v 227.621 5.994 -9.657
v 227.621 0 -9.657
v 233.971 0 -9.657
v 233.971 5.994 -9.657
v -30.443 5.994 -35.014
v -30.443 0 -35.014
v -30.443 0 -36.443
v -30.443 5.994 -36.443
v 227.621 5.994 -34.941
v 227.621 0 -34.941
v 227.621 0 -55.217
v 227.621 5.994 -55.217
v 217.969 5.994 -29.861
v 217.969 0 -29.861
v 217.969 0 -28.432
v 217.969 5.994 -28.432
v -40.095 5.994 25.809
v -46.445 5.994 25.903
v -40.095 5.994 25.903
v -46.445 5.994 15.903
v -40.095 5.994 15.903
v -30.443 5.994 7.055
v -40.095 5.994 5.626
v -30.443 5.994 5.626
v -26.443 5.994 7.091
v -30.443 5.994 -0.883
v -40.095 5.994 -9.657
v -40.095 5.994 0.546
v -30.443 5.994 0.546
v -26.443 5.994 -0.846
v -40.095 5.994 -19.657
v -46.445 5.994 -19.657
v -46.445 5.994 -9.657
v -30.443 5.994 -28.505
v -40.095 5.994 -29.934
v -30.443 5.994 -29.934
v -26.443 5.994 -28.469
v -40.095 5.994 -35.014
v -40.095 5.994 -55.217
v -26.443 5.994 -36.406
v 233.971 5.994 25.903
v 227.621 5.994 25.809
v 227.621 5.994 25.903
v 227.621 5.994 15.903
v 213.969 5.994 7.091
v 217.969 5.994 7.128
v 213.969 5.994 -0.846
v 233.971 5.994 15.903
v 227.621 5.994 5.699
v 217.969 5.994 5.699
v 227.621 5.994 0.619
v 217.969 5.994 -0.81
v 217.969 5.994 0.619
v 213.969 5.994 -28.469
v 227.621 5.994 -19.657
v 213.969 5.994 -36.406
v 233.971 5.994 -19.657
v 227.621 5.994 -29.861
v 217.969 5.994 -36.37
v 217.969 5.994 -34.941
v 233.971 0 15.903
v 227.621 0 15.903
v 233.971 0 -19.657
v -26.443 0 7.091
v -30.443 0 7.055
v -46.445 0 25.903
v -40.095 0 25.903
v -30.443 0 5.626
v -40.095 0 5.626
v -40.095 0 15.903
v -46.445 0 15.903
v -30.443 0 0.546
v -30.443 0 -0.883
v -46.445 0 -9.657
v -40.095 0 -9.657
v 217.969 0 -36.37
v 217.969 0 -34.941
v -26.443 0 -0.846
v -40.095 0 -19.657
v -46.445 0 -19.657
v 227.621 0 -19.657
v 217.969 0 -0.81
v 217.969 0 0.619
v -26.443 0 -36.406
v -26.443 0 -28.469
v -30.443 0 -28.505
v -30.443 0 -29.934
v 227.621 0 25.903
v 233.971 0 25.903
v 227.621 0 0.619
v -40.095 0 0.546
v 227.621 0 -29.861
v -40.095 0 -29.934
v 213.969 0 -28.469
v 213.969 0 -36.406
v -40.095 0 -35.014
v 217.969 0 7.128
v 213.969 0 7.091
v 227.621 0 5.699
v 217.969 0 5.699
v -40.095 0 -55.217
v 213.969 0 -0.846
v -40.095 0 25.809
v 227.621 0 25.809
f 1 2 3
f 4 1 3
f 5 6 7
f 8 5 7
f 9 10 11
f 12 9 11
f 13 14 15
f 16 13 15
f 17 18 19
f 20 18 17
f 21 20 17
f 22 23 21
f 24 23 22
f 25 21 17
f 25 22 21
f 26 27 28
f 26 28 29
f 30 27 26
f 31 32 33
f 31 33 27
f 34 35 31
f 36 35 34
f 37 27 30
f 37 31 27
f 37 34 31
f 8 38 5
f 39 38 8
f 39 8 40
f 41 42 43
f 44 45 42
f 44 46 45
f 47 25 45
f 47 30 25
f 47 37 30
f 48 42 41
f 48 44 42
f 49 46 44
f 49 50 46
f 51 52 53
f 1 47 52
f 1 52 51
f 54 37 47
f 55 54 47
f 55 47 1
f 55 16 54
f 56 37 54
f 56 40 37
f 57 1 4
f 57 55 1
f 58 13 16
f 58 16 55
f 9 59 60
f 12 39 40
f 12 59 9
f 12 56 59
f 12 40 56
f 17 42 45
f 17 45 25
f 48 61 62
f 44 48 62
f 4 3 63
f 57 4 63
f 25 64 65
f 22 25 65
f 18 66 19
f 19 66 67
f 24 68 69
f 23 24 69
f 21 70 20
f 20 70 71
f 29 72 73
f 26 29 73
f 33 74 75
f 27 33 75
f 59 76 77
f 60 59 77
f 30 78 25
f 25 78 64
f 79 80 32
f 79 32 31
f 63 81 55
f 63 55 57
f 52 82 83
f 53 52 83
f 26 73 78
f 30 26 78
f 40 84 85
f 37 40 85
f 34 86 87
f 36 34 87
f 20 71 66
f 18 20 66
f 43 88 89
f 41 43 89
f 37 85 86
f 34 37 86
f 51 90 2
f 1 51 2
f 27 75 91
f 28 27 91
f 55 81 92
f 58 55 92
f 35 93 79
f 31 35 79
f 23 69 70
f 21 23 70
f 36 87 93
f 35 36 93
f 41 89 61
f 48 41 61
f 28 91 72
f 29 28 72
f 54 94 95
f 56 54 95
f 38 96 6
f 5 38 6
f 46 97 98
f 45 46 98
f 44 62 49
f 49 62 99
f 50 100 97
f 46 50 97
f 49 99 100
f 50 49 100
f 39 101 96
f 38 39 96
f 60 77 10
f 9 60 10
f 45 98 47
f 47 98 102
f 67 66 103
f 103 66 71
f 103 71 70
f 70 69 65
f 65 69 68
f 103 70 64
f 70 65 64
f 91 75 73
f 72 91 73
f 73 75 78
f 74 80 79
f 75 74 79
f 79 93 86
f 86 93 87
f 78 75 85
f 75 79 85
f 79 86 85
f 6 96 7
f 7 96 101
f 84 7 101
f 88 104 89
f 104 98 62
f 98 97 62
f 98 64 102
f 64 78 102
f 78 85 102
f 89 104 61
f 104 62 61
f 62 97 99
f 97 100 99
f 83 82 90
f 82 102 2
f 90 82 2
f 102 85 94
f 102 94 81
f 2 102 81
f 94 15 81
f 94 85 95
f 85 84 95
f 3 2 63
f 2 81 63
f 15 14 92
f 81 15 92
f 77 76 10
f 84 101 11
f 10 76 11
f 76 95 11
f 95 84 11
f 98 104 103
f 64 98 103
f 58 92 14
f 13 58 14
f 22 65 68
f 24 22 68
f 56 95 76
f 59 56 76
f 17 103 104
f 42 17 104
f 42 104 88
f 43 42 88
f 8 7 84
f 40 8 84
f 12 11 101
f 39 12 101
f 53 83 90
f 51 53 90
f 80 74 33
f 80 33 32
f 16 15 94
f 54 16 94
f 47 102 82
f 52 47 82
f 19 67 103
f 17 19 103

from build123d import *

# Parameters (mm, degrees)
SKETCH1_W      = 6.35
SKETCH1_H      = 10
EXTRUDE1_DEPTH = 5.9944


with BuildPart() as part:
    # Sketch1 → Extrude1 (new body)
    with BuildSketch(Plane(origin=(0, 0, 0), x_dir=(1, 0, 0), z_dir=(0, 1, 0))):
        with Locations((-43.270242604, 14.657356551)):
            Rectangle(SKETCH1_W, SKETCH1_H)
        Polygon((227.620757396, 55.217356551), (-40.095242604, 55.217356551), (-40.095242604, 45.217356551), (-40.095242604, 35.01384638), (-30.443242604, 35.01384638), (-30.443242604, 36.44259638), (-26.443242604, 36.406106551), (-26.443242604, 28.468606551), (-30.443242604, 28.50509638), (-30.443242604, 29.93384638), (-40.095242604, 29.93384638), (-40.095242604, 19.657356551), (-40.095242604, 9.657356551), (-40.095242604, -0.54615362), (-30.443242604, -0.54615362), (-30.443242604, 0.88259638), (-26.443242604, 0.846106551), (-26.443242604, -7.091393449), (-30.443242604, -7.05490362), (-30.443242604, -5.62615362), (-40.095242604, -5.62615362), (-40.095242604, -15.902643449), (-40.095242604, -25.808643449), (227.620757396, -25.808643449), (227.620757396, -15.902643449), (227.620757396, -5.699133278), (217.968757396, -5.699133278), (217.968757396, -7.127883278), (213.968757396, -7.091393449), (213.968757396, 0.846106551), (217.968757396, 0.809616722), (217.968757396, -0.619133278), (227.620757396, -0.619133278), (227.620757396, 9.657356551), (227.620757396, 19.657356551), (227.620757396, 29.860866722), (217.968757396, 29.860866722), (217.968757396, 28.432116722), (213.968757396, 28.468606551), (213.968757396, 36.406106551), (217.968757396, 36.369616722), (217.968757396, 34.940866722), (227.620757396, 34.940866722), (227.620757396, 45.217356551), align=None)
        Polygon((-40.095242604, -25.808643449), (-40.095242604, -15.902643449), (-46.445242604, -15.902643449), (-46.445242604, -25.902643449), (-40.095242604, -25.902643449), align=None)
        Polygon((233.970757396, -15.902643449), (227.620757396, -15.902643449), (227.620757396, -25.808643449), (227.620757396, -25.902643449), (233.970757396, -25.902643449), align=None)
        with Locations((230.795757396, 14.657356551)):
            Rectangle(SKETCH1_W, SKETCH1_H)
    extrude(amount=EXTRUDE1_DEPTH)


solid = part.part
